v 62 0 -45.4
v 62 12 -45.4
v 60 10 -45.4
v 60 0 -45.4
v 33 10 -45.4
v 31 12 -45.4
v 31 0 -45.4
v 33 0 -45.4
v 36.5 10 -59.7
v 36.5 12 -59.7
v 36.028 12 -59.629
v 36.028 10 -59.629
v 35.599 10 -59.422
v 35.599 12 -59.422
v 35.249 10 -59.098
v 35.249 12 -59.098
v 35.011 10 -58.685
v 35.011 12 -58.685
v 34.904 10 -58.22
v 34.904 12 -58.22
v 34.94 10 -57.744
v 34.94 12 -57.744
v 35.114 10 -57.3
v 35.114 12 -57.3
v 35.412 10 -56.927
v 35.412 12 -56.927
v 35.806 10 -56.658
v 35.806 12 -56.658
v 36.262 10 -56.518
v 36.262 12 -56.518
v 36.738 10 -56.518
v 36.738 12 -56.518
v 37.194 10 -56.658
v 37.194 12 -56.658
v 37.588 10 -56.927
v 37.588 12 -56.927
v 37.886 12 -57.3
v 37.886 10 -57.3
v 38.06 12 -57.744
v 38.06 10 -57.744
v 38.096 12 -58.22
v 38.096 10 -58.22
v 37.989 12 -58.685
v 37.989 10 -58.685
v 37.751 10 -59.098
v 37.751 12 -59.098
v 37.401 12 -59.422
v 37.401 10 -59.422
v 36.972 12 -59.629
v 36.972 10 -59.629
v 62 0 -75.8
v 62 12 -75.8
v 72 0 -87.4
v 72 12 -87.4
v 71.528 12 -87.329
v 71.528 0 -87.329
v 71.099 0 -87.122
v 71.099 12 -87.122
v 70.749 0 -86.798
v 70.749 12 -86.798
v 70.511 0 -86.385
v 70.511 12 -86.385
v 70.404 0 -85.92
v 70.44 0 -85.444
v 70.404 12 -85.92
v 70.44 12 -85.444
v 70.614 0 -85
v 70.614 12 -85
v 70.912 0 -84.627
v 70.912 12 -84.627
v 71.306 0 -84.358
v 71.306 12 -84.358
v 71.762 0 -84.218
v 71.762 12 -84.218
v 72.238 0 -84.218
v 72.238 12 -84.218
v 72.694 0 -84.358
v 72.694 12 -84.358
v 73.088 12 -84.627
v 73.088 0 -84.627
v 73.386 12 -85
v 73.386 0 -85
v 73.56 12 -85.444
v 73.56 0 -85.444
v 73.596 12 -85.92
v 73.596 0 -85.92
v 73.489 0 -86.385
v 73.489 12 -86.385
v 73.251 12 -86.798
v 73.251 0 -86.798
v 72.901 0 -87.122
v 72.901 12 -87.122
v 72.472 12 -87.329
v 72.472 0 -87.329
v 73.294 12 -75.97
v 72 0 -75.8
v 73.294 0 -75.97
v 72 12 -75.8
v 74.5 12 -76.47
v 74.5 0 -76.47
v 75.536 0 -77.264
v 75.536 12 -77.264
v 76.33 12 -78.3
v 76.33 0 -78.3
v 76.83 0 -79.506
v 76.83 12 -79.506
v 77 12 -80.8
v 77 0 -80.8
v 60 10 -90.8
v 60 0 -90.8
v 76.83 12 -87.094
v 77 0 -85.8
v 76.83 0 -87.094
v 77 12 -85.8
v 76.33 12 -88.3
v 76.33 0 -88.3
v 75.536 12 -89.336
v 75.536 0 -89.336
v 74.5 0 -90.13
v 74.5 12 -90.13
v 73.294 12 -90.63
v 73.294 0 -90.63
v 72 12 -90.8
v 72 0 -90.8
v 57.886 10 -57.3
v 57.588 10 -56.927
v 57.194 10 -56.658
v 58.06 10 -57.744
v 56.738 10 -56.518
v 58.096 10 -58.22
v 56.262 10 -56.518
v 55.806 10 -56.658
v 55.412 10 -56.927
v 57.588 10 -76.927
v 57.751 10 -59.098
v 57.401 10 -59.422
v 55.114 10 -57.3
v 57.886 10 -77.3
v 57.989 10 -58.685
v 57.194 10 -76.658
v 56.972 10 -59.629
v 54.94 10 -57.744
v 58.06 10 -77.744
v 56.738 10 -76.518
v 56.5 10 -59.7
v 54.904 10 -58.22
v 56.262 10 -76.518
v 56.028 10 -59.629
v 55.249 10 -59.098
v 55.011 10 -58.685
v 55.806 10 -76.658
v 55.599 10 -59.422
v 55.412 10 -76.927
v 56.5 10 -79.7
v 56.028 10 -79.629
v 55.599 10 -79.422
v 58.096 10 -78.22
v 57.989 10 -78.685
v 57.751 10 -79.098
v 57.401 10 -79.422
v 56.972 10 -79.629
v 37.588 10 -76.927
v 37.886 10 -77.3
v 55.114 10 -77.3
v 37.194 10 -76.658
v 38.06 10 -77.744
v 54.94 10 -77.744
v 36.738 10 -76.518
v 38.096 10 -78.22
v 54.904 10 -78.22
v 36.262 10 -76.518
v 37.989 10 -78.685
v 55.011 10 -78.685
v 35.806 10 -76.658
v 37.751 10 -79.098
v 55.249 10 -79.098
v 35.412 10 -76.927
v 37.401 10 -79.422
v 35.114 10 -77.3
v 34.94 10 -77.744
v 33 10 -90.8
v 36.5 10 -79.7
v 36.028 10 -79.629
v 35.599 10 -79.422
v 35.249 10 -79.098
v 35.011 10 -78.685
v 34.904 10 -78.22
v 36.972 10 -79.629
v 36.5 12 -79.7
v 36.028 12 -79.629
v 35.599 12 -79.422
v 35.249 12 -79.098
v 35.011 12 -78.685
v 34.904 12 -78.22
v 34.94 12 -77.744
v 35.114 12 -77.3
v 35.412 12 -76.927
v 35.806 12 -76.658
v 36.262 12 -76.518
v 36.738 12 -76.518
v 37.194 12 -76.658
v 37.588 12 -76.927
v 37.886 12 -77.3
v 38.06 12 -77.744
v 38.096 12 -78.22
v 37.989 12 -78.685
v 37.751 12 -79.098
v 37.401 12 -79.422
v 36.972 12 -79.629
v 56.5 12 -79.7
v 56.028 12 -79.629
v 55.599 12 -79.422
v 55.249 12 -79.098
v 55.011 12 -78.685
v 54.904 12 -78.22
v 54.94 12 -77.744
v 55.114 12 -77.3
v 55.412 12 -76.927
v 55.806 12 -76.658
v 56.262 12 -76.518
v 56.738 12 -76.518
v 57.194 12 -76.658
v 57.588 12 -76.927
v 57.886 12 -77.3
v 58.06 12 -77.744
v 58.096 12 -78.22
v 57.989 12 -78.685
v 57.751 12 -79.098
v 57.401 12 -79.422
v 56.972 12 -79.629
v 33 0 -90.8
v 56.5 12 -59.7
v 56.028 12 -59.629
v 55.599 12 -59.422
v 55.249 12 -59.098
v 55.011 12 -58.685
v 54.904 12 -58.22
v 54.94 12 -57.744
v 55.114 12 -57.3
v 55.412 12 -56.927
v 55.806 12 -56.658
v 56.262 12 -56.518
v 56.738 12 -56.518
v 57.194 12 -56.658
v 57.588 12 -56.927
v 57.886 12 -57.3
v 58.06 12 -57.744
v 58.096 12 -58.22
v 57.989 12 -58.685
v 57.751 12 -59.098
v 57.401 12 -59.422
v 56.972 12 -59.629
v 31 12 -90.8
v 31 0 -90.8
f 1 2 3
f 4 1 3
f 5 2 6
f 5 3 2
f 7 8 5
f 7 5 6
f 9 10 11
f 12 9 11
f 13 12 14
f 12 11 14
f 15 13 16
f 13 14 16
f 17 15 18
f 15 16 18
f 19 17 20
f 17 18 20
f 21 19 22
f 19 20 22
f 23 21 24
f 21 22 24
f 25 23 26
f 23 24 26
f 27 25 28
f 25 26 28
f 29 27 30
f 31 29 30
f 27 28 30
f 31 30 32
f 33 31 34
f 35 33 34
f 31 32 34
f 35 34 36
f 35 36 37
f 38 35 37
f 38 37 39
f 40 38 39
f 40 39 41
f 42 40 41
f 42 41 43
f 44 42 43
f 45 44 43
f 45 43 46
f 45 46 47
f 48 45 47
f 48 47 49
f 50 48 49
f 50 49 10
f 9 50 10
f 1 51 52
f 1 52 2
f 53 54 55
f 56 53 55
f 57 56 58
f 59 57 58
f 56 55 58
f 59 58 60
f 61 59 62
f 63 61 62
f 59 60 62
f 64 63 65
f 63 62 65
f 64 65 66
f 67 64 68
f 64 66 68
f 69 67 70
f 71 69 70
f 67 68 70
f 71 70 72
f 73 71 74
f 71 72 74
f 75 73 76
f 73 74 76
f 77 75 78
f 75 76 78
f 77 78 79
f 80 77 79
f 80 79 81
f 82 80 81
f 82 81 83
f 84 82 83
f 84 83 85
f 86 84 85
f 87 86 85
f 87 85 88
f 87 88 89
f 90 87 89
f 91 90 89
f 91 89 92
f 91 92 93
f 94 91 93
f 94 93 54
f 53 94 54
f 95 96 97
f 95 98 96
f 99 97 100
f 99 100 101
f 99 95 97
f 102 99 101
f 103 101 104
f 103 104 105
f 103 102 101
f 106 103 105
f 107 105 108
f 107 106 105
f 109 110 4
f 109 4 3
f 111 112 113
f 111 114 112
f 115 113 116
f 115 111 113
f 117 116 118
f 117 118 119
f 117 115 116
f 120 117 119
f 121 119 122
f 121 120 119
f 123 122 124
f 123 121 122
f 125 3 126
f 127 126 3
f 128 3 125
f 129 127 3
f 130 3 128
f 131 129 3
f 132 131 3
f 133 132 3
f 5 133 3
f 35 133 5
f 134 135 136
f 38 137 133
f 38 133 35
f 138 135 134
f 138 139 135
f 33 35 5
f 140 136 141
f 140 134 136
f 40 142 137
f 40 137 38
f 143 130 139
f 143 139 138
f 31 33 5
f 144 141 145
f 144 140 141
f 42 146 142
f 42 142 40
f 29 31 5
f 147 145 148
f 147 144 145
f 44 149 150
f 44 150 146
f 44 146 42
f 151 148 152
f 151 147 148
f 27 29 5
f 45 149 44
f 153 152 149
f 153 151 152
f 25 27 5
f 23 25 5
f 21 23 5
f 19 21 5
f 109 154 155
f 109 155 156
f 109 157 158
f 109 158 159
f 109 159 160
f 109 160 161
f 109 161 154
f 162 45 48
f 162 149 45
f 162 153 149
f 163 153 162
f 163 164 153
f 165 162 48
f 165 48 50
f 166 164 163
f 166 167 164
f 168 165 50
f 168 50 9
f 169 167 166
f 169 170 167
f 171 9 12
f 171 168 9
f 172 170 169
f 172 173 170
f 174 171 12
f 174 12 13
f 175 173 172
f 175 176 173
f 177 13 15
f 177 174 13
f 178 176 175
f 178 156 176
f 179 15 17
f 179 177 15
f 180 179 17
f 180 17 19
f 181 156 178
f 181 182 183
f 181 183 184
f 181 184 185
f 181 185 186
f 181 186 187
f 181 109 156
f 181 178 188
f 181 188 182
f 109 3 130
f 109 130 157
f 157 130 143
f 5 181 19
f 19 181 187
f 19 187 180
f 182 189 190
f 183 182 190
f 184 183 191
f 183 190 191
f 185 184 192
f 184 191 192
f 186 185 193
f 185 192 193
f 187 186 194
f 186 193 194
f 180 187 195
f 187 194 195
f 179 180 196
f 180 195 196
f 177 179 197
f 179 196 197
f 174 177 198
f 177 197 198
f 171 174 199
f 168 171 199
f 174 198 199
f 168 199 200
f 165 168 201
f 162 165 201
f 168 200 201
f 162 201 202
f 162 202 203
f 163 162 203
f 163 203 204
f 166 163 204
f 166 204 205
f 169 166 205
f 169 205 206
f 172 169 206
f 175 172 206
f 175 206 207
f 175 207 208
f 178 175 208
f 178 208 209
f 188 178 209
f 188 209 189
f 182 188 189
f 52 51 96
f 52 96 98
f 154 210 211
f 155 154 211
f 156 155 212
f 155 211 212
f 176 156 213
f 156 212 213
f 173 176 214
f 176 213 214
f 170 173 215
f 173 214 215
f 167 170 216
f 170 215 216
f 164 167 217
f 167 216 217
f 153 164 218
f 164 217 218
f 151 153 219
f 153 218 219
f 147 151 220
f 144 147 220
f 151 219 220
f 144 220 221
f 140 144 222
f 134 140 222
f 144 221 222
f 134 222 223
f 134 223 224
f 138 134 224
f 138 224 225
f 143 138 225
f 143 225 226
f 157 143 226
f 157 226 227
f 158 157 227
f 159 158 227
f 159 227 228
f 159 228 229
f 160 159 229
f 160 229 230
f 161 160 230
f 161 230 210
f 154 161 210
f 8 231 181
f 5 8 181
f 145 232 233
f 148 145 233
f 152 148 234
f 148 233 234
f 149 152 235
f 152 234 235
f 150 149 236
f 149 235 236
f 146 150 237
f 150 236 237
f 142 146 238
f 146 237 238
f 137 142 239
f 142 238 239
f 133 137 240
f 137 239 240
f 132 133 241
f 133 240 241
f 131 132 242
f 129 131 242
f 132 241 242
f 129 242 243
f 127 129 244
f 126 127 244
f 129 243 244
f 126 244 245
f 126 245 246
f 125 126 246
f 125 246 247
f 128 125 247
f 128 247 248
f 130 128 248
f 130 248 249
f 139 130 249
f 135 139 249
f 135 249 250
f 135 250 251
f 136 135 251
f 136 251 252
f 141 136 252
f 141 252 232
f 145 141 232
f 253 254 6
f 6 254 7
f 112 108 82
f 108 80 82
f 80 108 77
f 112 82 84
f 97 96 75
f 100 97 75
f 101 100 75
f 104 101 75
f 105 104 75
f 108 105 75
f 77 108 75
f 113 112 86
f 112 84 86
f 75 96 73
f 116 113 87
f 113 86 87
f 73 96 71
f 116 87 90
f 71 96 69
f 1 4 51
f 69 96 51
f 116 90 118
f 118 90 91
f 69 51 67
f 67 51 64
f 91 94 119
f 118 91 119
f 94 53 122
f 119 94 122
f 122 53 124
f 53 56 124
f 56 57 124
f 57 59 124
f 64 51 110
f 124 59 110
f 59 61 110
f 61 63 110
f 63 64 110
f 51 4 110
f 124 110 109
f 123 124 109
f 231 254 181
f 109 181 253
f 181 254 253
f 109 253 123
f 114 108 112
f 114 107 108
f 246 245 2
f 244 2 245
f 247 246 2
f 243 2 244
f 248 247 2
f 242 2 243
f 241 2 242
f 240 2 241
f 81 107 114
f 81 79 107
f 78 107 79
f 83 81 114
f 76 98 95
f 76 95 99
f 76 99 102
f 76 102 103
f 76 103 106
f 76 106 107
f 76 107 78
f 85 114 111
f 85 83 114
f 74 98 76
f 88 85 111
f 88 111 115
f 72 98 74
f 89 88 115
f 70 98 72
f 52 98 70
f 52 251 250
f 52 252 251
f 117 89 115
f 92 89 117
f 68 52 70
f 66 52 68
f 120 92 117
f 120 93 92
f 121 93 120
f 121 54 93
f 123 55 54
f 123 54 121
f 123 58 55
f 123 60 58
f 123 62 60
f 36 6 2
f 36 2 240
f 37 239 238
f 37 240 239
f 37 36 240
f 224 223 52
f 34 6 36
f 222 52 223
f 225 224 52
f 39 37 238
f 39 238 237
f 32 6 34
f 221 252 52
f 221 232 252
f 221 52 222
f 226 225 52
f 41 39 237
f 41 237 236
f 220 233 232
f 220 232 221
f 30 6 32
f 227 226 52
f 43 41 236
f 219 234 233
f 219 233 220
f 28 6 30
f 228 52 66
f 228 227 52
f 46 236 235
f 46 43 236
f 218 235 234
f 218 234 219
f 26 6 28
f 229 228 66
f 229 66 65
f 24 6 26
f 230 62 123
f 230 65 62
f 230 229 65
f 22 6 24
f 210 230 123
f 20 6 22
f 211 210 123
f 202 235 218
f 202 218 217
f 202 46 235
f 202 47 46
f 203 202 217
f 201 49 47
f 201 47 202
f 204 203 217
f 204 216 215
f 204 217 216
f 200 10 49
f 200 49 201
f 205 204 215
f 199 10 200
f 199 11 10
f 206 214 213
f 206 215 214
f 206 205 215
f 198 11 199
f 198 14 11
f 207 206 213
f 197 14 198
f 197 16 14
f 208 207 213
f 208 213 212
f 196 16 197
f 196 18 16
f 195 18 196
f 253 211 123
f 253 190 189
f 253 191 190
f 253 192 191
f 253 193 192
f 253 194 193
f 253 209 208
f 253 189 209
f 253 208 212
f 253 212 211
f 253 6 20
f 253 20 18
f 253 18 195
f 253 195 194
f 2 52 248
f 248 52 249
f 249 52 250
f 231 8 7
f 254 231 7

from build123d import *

# Parameters (mm, degrees)
SKETCH1_W           = 31
SKETCH1_H           = 45.4
BOSS_EXTRUDE1_DEPTH = 12
SKETCH2_W           = 27
SKETCH2_H           = 10
CUT_EXTRUDE1_DEPTH  = 57.268641356
SKETCH3_R           = 1.6
CUT_EXTRUDE2_DEPTH  = 10
SKETCH4_W           = 15
SKETCH4_H           = 12
BOSS_EXTRUDE2_DEPTH = 15
SKETCH5_R           = 1.6
CUT_EXTRUDE3_DEPTH  = 20
FILLET1_R           = 5


with BuildPart() as part:
    # Sketch1 → Boss-Extrude1 (new body)
    with BuildSketch(Plane(origin=(0, 0, 0), x_dir=(1, 0, 0), z_dir=(0, 1, 0))):
        with Locations((15.5, 22.7)):
            Rectangle(SKETCH1_W, SKETCH1_H)
    extrude(amount=BOSS_EXTRUDE1_DEPTH)

    # Sketch2 → Cut-Extrude1 (cut, through all)
    with BuildSketch(Plane.XY):
        with Locations((15.5, 5)):
            Rectangle(SKETCH2_W, SKETCH2_H)
    extrude(amount=-CUT_EXTRUDE1_DEPTH, mode=Mode.SUBTRACT)

    # Sketch3 → Cut-Extrude2 (cut)
    with BuildSketch(Plane(origin=(0, 12, 0), x_dir=(1, 0, 0), z_dir=(0, 1, 0))):
        with Locations(Location((5.5, 32.7, 0), (0, 0, 270))):
            Circle(SKETCH3_R)
        with Locations(Location((25.5, 32.7, 0), (0, 0, 270))):
            Circle(SKETCH3_R)
        with Locations(Location((25.5, 12.7, 0), (0, 0, 270))):
            Circle(SKETCH3_R)
        with Locations(Location((5.5, 12.7, 0), (0, 0, 270))):
            Circle(SKETCH3_R)
    extrude(amount=-CUT_EXTRUDE2_DEPTH, mode=Mode.SUBTRACT)

    # Sketch4 → Boss-Extrude2 (add)
    with BuildSketch(Plane.ZY):
        with Locations((-7.5, 6)):
            Rectangle(SKETCH4_W, SKETCH4_H)
    extrude(amount=BOSS_EXTRUDE2_DEPTH)

    # Sketch5 → Cut-Extrude3 (cut)
    with BuildSketch(Plane(origin=(0, 12, 0), x_dir=(1, 0, 0), z_dir=(0, 1, 0))):
        with Locations(Location((-10, 5, 0), (0, 0, 270))):
            Circle(SKETCH5_R)
    extrude(amount=-CUT_EXTRUDE3_DEPTH, mode=Mode.SUBTRACT)

    # Fillet1
    fillet1_edges = [part.edges().sort_by_distance(p)[0] for p in [
        (-15, 6, -15),
        (-15, 6, 0),
    ]]
    fillet(fillet1_edges, radius=FILLET1_R)


with BuildPart() as body_2:
    # Mirror2: mirrored copy
    add(part.part.mirror(Plane(origin=(31, 12, 0), x_dir=(0, 0, 1), z_dir=(-1, 0, 0))))


with BuildPart() as body_3:
    # Mirror3: mirrored copy
    add(body_2.part.mirror(Plane(origin=(62, 12, -45.4), x_dir=(1, 0, 0), z_dir=(0, 0, 1))))


solid = body_3.part
